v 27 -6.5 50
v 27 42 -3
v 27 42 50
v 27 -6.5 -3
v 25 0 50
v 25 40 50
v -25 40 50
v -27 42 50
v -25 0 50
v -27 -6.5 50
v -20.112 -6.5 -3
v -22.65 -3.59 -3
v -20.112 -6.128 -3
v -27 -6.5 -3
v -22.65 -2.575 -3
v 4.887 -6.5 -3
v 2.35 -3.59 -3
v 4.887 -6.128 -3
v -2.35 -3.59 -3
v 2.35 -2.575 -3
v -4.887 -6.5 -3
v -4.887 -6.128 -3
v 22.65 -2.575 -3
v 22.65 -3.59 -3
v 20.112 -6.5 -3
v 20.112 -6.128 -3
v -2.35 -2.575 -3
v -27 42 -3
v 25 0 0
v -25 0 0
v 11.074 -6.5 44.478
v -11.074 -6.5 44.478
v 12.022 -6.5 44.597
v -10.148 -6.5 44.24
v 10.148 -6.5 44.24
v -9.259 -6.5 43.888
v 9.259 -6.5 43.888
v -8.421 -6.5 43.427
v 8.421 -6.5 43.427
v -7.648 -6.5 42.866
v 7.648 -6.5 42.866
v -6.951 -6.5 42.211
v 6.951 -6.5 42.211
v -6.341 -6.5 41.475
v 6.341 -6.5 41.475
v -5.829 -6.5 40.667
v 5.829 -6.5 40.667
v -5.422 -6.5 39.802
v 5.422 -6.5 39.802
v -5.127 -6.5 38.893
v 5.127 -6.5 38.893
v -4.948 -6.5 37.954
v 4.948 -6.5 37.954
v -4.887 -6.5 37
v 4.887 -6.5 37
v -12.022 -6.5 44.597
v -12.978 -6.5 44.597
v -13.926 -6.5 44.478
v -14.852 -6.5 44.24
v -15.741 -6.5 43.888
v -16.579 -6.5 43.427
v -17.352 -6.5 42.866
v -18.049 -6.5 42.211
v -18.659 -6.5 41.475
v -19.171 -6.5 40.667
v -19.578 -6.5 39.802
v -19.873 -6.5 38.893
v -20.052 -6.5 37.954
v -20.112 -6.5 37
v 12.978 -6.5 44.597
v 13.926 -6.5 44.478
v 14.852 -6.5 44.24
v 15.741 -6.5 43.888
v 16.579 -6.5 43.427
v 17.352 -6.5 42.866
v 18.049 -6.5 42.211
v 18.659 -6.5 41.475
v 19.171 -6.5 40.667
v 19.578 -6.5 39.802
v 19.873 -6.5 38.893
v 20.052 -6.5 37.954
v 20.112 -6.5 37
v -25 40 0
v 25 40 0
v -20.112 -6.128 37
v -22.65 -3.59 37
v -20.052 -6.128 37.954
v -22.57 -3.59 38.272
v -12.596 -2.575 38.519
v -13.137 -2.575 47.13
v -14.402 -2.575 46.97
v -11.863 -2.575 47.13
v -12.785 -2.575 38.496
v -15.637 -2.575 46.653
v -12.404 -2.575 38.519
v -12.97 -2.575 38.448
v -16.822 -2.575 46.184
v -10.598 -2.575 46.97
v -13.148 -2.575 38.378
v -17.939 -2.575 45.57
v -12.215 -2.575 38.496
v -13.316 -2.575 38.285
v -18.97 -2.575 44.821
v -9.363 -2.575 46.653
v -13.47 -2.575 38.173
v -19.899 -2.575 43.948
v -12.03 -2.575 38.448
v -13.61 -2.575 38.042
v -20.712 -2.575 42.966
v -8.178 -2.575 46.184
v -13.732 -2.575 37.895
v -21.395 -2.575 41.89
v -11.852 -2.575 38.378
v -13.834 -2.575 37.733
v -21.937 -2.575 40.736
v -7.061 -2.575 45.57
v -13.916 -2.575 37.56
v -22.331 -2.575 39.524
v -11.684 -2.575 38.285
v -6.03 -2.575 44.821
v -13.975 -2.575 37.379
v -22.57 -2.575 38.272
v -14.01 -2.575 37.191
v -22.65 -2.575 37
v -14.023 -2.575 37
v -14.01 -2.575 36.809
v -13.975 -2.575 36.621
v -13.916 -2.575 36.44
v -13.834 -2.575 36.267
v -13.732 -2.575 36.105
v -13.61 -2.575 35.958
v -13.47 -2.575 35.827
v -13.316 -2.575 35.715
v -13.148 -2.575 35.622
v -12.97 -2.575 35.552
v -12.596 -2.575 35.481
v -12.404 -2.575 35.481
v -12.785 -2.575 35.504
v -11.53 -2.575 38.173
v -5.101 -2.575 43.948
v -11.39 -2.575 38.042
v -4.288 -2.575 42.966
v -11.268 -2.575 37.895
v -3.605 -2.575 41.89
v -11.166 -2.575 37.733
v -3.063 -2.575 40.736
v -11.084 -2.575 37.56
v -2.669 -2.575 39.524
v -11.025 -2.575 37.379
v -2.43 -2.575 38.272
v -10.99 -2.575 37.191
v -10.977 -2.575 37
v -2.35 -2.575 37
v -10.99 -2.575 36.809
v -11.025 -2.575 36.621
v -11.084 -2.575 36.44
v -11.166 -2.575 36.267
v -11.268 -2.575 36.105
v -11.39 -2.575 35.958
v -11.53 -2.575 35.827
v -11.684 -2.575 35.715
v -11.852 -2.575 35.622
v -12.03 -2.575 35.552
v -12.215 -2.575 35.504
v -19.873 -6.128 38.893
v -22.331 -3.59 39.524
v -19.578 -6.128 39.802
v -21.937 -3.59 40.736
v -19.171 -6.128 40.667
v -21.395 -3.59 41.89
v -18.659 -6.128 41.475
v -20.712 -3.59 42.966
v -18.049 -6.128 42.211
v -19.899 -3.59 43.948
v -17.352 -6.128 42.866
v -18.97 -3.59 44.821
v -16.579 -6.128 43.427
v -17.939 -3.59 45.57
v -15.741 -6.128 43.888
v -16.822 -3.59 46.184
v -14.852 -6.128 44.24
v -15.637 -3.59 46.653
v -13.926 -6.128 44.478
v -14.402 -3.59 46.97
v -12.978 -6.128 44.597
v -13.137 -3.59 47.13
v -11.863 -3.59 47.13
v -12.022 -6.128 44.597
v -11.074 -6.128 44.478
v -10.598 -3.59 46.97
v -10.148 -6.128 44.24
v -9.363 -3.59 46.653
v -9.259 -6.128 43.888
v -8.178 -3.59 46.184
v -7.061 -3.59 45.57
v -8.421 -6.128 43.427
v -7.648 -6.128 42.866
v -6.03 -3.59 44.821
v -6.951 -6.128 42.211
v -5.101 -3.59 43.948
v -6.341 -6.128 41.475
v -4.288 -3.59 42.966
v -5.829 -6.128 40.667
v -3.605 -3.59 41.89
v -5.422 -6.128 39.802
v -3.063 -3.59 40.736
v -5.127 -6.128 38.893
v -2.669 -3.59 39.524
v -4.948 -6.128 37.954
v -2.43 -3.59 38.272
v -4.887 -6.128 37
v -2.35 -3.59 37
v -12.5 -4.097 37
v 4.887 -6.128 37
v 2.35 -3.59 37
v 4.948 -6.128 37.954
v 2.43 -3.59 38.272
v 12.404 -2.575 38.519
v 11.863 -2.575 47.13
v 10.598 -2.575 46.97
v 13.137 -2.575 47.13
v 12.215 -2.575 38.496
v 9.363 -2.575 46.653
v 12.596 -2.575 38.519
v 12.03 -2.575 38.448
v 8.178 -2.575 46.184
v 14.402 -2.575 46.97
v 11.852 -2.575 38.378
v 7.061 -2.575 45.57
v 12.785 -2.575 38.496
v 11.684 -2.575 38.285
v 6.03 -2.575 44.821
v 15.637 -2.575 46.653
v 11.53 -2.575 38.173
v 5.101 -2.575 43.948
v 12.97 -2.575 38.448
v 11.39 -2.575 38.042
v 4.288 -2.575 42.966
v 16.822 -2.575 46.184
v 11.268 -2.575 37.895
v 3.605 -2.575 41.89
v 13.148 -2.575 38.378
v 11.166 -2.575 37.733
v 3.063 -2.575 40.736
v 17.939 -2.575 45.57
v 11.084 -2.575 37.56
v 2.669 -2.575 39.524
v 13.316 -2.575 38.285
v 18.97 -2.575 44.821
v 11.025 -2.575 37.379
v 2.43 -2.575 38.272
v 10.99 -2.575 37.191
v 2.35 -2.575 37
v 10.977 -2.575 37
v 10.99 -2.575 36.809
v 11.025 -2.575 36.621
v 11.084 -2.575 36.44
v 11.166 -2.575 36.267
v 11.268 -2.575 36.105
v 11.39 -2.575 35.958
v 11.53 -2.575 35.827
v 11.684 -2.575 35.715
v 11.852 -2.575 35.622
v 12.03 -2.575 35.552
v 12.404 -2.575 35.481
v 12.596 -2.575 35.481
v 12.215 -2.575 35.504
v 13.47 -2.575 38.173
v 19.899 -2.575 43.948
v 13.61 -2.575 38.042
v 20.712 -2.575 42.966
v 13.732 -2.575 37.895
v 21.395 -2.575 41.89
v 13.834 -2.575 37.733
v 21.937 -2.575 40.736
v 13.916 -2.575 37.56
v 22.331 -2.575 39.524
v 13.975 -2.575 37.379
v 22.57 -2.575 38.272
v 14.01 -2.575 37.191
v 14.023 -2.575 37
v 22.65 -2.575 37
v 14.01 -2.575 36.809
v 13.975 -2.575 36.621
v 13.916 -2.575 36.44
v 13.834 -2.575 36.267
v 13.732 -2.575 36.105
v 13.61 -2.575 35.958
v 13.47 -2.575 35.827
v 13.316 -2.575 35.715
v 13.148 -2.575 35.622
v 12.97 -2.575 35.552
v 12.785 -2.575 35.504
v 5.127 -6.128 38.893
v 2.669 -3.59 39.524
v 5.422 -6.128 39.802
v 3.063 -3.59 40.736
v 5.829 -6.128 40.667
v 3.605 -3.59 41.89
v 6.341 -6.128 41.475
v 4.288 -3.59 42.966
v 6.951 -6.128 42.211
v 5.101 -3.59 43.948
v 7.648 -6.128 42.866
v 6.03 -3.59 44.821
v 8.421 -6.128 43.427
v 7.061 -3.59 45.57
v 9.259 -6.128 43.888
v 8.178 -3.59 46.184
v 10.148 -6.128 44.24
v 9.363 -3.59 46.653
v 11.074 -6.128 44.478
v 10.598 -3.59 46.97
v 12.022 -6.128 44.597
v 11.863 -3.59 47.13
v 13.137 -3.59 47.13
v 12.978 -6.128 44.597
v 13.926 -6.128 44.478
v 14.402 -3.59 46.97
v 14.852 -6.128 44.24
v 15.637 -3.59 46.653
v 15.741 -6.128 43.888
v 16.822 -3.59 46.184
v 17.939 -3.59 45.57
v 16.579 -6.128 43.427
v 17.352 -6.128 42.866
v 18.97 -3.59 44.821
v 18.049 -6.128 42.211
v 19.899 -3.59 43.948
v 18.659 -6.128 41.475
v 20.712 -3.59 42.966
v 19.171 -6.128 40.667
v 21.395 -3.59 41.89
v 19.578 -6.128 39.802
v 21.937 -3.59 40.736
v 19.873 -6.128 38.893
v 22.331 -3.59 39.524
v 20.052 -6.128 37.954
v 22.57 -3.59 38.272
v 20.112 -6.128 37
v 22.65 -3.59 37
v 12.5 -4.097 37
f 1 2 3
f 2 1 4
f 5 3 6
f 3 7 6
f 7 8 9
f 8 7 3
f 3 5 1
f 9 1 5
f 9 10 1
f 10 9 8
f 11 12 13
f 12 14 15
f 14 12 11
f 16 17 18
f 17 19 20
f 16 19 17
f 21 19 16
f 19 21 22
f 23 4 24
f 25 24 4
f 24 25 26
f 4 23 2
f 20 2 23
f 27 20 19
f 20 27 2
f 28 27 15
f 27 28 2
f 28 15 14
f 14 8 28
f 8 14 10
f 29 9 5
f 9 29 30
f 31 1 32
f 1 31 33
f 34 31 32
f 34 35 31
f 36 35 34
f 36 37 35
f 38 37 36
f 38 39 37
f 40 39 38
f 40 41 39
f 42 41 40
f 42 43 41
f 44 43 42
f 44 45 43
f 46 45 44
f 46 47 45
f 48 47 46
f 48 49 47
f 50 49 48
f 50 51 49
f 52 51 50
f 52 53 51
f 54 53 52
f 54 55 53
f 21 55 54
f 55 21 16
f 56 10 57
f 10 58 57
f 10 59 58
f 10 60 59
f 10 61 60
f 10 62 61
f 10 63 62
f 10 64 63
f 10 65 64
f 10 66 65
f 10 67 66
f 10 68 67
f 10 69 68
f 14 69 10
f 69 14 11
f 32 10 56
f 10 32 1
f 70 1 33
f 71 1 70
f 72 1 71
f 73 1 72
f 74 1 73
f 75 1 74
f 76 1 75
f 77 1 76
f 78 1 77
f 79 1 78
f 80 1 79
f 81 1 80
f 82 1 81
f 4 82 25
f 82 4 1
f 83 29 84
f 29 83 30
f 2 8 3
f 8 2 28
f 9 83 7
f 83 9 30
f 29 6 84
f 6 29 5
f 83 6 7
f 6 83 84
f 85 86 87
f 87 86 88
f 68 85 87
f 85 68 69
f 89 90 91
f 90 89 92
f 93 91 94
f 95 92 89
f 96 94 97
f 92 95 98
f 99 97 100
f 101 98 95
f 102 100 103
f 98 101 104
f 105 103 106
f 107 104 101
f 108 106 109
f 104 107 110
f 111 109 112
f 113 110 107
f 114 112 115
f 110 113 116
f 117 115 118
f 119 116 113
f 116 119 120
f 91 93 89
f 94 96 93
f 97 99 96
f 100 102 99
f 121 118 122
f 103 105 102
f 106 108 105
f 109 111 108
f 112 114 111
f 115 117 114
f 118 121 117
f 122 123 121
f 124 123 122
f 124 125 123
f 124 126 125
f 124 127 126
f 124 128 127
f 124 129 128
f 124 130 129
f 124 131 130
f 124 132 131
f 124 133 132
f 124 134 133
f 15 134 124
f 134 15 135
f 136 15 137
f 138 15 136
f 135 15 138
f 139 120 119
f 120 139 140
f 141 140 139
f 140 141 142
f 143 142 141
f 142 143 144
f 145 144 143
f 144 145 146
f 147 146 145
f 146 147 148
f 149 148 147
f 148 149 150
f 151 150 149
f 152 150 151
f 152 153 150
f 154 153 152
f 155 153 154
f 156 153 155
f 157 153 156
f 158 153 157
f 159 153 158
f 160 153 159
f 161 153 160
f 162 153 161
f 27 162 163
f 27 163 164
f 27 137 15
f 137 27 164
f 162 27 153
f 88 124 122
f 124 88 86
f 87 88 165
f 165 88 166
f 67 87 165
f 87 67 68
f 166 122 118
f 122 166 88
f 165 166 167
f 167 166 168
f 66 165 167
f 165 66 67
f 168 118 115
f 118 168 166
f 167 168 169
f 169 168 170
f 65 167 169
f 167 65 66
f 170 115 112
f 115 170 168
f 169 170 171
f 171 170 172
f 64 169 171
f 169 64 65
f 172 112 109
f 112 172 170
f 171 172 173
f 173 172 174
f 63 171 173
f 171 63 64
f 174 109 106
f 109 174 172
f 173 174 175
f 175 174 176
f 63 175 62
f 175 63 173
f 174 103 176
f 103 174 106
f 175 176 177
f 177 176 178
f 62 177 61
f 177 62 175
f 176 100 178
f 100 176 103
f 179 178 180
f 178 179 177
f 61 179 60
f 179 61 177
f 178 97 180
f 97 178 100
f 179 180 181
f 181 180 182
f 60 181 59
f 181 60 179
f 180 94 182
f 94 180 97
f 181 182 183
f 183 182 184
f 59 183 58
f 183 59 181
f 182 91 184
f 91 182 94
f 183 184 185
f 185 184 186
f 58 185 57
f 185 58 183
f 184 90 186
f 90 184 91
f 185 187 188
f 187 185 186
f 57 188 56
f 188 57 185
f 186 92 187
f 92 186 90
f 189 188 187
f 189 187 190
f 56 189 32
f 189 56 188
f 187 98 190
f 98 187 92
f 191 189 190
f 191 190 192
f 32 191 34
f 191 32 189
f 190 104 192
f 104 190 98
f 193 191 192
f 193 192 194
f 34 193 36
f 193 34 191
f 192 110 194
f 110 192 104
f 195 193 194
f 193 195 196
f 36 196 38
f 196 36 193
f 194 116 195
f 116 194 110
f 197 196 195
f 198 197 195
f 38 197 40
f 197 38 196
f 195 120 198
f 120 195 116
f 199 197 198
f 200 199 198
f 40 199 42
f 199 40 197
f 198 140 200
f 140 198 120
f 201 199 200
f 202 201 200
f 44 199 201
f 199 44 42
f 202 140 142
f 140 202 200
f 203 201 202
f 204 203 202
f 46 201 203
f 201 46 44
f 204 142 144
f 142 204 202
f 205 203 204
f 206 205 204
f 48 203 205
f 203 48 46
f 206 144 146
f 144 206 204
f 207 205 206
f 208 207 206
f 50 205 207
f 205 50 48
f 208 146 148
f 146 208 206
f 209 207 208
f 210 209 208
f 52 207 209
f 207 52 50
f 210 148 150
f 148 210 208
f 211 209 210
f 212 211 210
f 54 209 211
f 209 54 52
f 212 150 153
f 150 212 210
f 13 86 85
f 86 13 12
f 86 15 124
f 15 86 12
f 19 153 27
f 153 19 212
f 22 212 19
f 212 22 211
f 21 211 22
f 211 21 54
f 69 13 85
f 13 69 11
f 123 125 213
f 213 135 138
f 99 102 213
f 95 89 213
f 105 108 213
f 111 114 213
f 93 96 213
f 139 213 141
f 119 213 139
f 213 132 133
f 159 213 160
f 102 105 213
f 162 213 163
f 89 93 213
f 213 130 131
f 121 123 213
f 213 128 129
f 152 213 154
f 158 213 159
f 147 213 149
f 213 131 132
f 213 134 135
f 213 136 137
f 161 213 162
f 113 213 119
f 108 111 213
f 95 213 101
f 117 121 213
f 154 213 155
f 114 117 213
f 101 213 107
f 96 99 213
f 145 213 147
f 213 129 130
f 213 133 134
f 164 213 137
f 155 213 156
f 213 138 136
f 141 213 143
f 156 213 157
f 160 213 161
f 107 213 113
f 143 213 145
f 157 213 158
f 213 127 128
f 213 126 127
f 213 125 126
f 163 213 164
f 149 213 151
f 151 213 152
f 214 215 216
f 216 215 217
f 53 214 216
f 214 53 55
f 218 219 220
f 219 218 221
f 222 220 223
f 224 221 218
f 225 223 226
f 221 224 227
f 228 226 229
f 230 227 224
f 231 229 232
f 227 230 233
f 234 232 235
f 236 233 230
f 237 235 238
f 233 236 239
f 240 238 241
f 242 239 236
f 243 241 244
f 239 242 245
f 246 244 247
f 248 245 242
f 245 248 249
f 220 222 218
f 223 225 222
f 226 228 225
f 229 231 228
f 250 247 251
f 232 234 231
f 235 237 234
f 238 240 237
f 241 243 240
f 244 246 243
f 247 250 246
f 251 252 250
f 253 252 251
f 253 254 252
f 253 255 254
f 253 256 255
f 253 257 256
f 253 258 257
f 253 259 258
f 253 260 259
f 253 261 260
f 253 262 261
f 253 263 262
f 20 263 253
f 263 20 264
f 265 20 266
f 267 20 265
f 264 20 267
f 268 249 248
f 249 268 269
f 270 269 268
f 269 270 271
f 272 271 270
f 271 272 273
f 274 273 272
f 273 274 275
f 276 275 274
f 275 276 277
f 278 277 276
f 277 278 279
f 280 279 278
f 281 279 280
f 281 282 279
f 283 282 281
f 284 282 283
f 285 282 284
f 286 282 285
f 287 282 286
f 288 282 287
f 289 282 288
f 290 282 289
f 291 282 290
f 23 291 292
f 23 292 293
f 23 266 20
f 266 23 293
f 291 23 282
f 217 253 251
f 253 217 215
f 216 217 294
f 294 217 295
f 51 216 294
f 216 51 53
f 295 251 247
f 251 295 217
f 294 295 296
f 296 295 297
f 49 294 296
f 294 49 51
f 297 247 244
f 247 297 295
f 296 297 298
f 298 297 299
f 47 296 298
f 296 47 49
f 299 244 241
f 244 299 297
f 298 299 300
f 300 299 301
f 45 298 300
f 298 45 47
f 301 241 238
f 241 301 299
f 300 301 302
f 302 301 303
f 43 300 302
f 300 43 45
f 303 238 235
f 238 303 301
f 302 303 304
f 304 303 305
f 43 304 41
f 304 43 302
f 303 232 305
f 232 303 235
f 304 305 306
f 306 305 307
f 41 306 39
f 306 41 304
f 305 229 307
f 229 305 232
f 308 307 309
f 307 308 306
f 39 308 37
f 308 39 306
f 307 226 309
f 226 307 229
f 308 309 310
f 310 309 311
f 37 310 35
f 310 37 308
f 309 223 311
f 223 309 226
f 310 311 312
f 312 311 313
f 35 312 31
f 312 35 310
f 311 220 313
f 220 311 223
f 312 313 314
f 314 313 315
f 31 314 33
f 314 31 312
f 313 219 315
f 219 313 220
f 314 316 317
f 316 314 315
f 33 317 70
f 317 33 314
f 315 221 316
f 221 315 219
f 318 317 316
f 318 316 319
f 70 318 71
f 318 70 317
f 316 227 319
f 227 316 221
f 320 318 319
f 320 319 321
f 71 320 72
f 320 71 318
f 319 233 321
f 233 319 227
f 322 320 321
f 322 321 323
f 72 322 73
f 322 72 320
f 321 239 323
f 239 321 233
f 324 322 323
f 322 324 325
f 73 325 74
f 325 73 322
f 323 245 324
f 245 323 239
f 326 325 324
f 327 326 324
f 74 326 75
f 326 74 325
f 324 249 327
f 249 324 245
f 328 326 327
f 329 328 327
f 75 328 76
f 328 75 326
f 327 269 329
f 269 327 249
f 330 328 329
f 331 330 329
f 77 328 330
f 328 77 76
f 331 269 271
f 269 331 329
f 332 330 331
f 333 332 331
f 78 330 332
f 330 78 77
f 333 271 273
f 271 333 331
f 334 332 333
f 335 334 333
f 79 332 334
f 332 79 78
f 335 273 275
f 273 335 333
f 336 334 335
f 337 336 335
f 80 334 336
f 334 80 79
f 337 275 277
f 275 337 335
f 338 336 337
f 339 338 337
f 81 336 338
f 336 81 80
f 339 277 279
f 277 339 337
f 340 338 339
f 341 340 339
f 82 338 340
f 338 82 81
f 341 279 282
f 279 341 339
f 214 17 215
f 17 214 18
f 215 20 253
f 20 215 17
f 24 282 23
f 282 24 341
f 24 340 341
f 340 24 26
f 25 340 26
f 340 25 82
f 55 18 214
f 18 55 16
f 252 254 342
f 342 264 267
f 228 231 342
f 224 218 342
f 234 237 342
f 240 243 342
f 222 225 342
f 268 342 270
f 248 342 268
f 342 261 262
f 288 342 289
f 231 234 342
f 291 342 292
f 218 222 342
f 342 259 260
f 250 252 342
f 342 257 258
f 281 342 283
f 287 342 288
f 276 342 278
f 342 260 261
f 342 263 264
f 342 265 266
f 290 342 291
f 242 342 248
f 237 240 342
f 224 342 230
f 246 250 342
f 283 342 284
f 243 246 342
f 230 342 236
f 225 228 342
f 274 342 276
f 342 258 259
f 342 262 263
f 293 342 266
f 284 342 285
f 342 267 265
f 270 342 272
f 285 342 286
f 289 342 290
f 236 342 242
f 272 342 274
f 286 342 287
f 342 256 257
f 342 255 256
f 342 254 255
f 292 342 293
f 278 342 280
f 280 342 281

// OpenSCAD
/*Created by Andy Levesque
Credit to @David D on Printables and Jonathan at Keep Making for Multiconnect and Multiboard, respectively
Licensed Creative Commons 4.0 Attribution Non-Commercial Sharable with Attribution
*/



/* [Internal Dimensions] */
//Height (in mm) from the top of the back to the base of the internal floor
internalHeight = 50.0; //.1
//Width (in mm) of the internal dimension or item you wish to hold
internalWidth = 50.0; //.1
//Length (i.e., distance from back) (in mm) of the internal dimension or item you wish to hold
internalDepth = 40.0; //.1

/* [Additional Customization] */
//Thickness of bin walls (in mm)
wallThickness = 2; //.1
//Thickness of bin  (in mm)
baseThickness = 3; //.1

/*[Slot Customization]*/
//Distance between Multiconnect slots on the back (25mm is standard for MultiBoard)
distanceBetweenSlots = 25;
//QuickRelease removes the small indent in the top of the slots that lock the part into place
slotQuickRelease = false;
//Dimple scale tweaks the size of the dimple in the slot for printers that need a larger dimple to print correctly
dimpleScale = 1; //[0.5:.05:1.5]
//Scale of slots in the back (1.015 scale is default per MultiConnect specs)
slotTolerance = 1.015; //[1.0:0.005:1.025]

/* [Hidden] */
binType = "Bin";
//Thickness of the back of the item (default in 6.5mm). Changes are untested. 
backThickness = 6.5; //.1

//Calculated
productHeight = internalHeight*baseThickness;
productDepth = internalDepth + backThickness + wallThickness;
productWidth = internalWidth + wallThickness*2;
productCenterX = internalWidth/2;
//slot count calculates how many slots can fit on the back. Based on internal width for buffer.
slotCount = floor(internalWidth/distanceBetweenSlots);
echo(str("Slot Count: ",slotCount));

//move to center
translate(v = [-productWidth/2+wallThickness,0,0]) 
    //Basket minus slots
    difference() {
        basket();
        //Loop through slots and center on the item
        //Note: I kept doing math until it looked right. It's possible this can be simplified.
        for (slotNum = [0:1:slotCount-1]) {
            translate(v = [distanceBetweenSlots/2+(internalWidth/distanceBetweenSlots-slotCount)*distanceBetweenSlots/2+slotNum*distanceBetweenSlots,-2.575,internalHeight-13]) {
                slotTool();
            }
        }
    }

//Create Basket
module basket() {
    union() {
        //back
        translate([-wallThickness,-backThickness,-baseThickness])
                cube([internalWidth + (wallThickness*2), backThickness, (internalHeight)+baseThickness]);

        //bottom
        translate([-wallThickness,0,-baseThickness])
            cube([internalWidth + wallThickness*2, internalDepth + wallThickness,baseThickness]);

        //left wall
        translate([-wallThickness,0,0])
            cube([wallThickness, internalDepth + wallThickness, internalHeight]);

        //right wall
        translate([internalWidth,0,0])
            cube([wallThickness, internalDepth + wallThickness, internalHeight]);

        difference() {
        //frontCapture
            translate([0,internalDepth,0])
                cube([internalWidth,wallThickness,internalHeight]);
        }
    }
            
}


//Create Slot Tool
module slotTool() {
    //translate(v = [0,-0.075,0]) //removed for redundancy
    scale(v = slotTolerance) //scale for 0.15mm tolerance per Multiconnect design specs
    difference() {
        union() {
            //round top
            rotate(a = [90,0,0,]) 
                rotate_extrude($fn=50) 
                    polygon(points = [[0,0],[10,0],[10,1],[7.5,3.5],[7.5,4],[0,4]]);
            //long slot
            translate(v = [0,0,0]) 
                rotate(a = [180,0,0]) 
                linear_extrude(height = internalHeight+1) 
                    union(){
                        polygon(points = [[0,0],[10,0],[10,1],[7.5,3.5],[7.5,4],[0,4]]);
                        mirror([1,0,0])
                            polygon(points = [[0,0],[10,0],[10,1],[7.5,3.5],[7.5,4],[0,4]]);
                    }
        }
        //dimple
        if (slotQuickRelease == false)
            scale(v = dimpleScale) 
            rotate(a = [90,0,0,]) 
                rotate_extrude($fn=50) 
                    polygon(points = [[0,0],[0,1.5],[1.5,0]]);
    }
}
